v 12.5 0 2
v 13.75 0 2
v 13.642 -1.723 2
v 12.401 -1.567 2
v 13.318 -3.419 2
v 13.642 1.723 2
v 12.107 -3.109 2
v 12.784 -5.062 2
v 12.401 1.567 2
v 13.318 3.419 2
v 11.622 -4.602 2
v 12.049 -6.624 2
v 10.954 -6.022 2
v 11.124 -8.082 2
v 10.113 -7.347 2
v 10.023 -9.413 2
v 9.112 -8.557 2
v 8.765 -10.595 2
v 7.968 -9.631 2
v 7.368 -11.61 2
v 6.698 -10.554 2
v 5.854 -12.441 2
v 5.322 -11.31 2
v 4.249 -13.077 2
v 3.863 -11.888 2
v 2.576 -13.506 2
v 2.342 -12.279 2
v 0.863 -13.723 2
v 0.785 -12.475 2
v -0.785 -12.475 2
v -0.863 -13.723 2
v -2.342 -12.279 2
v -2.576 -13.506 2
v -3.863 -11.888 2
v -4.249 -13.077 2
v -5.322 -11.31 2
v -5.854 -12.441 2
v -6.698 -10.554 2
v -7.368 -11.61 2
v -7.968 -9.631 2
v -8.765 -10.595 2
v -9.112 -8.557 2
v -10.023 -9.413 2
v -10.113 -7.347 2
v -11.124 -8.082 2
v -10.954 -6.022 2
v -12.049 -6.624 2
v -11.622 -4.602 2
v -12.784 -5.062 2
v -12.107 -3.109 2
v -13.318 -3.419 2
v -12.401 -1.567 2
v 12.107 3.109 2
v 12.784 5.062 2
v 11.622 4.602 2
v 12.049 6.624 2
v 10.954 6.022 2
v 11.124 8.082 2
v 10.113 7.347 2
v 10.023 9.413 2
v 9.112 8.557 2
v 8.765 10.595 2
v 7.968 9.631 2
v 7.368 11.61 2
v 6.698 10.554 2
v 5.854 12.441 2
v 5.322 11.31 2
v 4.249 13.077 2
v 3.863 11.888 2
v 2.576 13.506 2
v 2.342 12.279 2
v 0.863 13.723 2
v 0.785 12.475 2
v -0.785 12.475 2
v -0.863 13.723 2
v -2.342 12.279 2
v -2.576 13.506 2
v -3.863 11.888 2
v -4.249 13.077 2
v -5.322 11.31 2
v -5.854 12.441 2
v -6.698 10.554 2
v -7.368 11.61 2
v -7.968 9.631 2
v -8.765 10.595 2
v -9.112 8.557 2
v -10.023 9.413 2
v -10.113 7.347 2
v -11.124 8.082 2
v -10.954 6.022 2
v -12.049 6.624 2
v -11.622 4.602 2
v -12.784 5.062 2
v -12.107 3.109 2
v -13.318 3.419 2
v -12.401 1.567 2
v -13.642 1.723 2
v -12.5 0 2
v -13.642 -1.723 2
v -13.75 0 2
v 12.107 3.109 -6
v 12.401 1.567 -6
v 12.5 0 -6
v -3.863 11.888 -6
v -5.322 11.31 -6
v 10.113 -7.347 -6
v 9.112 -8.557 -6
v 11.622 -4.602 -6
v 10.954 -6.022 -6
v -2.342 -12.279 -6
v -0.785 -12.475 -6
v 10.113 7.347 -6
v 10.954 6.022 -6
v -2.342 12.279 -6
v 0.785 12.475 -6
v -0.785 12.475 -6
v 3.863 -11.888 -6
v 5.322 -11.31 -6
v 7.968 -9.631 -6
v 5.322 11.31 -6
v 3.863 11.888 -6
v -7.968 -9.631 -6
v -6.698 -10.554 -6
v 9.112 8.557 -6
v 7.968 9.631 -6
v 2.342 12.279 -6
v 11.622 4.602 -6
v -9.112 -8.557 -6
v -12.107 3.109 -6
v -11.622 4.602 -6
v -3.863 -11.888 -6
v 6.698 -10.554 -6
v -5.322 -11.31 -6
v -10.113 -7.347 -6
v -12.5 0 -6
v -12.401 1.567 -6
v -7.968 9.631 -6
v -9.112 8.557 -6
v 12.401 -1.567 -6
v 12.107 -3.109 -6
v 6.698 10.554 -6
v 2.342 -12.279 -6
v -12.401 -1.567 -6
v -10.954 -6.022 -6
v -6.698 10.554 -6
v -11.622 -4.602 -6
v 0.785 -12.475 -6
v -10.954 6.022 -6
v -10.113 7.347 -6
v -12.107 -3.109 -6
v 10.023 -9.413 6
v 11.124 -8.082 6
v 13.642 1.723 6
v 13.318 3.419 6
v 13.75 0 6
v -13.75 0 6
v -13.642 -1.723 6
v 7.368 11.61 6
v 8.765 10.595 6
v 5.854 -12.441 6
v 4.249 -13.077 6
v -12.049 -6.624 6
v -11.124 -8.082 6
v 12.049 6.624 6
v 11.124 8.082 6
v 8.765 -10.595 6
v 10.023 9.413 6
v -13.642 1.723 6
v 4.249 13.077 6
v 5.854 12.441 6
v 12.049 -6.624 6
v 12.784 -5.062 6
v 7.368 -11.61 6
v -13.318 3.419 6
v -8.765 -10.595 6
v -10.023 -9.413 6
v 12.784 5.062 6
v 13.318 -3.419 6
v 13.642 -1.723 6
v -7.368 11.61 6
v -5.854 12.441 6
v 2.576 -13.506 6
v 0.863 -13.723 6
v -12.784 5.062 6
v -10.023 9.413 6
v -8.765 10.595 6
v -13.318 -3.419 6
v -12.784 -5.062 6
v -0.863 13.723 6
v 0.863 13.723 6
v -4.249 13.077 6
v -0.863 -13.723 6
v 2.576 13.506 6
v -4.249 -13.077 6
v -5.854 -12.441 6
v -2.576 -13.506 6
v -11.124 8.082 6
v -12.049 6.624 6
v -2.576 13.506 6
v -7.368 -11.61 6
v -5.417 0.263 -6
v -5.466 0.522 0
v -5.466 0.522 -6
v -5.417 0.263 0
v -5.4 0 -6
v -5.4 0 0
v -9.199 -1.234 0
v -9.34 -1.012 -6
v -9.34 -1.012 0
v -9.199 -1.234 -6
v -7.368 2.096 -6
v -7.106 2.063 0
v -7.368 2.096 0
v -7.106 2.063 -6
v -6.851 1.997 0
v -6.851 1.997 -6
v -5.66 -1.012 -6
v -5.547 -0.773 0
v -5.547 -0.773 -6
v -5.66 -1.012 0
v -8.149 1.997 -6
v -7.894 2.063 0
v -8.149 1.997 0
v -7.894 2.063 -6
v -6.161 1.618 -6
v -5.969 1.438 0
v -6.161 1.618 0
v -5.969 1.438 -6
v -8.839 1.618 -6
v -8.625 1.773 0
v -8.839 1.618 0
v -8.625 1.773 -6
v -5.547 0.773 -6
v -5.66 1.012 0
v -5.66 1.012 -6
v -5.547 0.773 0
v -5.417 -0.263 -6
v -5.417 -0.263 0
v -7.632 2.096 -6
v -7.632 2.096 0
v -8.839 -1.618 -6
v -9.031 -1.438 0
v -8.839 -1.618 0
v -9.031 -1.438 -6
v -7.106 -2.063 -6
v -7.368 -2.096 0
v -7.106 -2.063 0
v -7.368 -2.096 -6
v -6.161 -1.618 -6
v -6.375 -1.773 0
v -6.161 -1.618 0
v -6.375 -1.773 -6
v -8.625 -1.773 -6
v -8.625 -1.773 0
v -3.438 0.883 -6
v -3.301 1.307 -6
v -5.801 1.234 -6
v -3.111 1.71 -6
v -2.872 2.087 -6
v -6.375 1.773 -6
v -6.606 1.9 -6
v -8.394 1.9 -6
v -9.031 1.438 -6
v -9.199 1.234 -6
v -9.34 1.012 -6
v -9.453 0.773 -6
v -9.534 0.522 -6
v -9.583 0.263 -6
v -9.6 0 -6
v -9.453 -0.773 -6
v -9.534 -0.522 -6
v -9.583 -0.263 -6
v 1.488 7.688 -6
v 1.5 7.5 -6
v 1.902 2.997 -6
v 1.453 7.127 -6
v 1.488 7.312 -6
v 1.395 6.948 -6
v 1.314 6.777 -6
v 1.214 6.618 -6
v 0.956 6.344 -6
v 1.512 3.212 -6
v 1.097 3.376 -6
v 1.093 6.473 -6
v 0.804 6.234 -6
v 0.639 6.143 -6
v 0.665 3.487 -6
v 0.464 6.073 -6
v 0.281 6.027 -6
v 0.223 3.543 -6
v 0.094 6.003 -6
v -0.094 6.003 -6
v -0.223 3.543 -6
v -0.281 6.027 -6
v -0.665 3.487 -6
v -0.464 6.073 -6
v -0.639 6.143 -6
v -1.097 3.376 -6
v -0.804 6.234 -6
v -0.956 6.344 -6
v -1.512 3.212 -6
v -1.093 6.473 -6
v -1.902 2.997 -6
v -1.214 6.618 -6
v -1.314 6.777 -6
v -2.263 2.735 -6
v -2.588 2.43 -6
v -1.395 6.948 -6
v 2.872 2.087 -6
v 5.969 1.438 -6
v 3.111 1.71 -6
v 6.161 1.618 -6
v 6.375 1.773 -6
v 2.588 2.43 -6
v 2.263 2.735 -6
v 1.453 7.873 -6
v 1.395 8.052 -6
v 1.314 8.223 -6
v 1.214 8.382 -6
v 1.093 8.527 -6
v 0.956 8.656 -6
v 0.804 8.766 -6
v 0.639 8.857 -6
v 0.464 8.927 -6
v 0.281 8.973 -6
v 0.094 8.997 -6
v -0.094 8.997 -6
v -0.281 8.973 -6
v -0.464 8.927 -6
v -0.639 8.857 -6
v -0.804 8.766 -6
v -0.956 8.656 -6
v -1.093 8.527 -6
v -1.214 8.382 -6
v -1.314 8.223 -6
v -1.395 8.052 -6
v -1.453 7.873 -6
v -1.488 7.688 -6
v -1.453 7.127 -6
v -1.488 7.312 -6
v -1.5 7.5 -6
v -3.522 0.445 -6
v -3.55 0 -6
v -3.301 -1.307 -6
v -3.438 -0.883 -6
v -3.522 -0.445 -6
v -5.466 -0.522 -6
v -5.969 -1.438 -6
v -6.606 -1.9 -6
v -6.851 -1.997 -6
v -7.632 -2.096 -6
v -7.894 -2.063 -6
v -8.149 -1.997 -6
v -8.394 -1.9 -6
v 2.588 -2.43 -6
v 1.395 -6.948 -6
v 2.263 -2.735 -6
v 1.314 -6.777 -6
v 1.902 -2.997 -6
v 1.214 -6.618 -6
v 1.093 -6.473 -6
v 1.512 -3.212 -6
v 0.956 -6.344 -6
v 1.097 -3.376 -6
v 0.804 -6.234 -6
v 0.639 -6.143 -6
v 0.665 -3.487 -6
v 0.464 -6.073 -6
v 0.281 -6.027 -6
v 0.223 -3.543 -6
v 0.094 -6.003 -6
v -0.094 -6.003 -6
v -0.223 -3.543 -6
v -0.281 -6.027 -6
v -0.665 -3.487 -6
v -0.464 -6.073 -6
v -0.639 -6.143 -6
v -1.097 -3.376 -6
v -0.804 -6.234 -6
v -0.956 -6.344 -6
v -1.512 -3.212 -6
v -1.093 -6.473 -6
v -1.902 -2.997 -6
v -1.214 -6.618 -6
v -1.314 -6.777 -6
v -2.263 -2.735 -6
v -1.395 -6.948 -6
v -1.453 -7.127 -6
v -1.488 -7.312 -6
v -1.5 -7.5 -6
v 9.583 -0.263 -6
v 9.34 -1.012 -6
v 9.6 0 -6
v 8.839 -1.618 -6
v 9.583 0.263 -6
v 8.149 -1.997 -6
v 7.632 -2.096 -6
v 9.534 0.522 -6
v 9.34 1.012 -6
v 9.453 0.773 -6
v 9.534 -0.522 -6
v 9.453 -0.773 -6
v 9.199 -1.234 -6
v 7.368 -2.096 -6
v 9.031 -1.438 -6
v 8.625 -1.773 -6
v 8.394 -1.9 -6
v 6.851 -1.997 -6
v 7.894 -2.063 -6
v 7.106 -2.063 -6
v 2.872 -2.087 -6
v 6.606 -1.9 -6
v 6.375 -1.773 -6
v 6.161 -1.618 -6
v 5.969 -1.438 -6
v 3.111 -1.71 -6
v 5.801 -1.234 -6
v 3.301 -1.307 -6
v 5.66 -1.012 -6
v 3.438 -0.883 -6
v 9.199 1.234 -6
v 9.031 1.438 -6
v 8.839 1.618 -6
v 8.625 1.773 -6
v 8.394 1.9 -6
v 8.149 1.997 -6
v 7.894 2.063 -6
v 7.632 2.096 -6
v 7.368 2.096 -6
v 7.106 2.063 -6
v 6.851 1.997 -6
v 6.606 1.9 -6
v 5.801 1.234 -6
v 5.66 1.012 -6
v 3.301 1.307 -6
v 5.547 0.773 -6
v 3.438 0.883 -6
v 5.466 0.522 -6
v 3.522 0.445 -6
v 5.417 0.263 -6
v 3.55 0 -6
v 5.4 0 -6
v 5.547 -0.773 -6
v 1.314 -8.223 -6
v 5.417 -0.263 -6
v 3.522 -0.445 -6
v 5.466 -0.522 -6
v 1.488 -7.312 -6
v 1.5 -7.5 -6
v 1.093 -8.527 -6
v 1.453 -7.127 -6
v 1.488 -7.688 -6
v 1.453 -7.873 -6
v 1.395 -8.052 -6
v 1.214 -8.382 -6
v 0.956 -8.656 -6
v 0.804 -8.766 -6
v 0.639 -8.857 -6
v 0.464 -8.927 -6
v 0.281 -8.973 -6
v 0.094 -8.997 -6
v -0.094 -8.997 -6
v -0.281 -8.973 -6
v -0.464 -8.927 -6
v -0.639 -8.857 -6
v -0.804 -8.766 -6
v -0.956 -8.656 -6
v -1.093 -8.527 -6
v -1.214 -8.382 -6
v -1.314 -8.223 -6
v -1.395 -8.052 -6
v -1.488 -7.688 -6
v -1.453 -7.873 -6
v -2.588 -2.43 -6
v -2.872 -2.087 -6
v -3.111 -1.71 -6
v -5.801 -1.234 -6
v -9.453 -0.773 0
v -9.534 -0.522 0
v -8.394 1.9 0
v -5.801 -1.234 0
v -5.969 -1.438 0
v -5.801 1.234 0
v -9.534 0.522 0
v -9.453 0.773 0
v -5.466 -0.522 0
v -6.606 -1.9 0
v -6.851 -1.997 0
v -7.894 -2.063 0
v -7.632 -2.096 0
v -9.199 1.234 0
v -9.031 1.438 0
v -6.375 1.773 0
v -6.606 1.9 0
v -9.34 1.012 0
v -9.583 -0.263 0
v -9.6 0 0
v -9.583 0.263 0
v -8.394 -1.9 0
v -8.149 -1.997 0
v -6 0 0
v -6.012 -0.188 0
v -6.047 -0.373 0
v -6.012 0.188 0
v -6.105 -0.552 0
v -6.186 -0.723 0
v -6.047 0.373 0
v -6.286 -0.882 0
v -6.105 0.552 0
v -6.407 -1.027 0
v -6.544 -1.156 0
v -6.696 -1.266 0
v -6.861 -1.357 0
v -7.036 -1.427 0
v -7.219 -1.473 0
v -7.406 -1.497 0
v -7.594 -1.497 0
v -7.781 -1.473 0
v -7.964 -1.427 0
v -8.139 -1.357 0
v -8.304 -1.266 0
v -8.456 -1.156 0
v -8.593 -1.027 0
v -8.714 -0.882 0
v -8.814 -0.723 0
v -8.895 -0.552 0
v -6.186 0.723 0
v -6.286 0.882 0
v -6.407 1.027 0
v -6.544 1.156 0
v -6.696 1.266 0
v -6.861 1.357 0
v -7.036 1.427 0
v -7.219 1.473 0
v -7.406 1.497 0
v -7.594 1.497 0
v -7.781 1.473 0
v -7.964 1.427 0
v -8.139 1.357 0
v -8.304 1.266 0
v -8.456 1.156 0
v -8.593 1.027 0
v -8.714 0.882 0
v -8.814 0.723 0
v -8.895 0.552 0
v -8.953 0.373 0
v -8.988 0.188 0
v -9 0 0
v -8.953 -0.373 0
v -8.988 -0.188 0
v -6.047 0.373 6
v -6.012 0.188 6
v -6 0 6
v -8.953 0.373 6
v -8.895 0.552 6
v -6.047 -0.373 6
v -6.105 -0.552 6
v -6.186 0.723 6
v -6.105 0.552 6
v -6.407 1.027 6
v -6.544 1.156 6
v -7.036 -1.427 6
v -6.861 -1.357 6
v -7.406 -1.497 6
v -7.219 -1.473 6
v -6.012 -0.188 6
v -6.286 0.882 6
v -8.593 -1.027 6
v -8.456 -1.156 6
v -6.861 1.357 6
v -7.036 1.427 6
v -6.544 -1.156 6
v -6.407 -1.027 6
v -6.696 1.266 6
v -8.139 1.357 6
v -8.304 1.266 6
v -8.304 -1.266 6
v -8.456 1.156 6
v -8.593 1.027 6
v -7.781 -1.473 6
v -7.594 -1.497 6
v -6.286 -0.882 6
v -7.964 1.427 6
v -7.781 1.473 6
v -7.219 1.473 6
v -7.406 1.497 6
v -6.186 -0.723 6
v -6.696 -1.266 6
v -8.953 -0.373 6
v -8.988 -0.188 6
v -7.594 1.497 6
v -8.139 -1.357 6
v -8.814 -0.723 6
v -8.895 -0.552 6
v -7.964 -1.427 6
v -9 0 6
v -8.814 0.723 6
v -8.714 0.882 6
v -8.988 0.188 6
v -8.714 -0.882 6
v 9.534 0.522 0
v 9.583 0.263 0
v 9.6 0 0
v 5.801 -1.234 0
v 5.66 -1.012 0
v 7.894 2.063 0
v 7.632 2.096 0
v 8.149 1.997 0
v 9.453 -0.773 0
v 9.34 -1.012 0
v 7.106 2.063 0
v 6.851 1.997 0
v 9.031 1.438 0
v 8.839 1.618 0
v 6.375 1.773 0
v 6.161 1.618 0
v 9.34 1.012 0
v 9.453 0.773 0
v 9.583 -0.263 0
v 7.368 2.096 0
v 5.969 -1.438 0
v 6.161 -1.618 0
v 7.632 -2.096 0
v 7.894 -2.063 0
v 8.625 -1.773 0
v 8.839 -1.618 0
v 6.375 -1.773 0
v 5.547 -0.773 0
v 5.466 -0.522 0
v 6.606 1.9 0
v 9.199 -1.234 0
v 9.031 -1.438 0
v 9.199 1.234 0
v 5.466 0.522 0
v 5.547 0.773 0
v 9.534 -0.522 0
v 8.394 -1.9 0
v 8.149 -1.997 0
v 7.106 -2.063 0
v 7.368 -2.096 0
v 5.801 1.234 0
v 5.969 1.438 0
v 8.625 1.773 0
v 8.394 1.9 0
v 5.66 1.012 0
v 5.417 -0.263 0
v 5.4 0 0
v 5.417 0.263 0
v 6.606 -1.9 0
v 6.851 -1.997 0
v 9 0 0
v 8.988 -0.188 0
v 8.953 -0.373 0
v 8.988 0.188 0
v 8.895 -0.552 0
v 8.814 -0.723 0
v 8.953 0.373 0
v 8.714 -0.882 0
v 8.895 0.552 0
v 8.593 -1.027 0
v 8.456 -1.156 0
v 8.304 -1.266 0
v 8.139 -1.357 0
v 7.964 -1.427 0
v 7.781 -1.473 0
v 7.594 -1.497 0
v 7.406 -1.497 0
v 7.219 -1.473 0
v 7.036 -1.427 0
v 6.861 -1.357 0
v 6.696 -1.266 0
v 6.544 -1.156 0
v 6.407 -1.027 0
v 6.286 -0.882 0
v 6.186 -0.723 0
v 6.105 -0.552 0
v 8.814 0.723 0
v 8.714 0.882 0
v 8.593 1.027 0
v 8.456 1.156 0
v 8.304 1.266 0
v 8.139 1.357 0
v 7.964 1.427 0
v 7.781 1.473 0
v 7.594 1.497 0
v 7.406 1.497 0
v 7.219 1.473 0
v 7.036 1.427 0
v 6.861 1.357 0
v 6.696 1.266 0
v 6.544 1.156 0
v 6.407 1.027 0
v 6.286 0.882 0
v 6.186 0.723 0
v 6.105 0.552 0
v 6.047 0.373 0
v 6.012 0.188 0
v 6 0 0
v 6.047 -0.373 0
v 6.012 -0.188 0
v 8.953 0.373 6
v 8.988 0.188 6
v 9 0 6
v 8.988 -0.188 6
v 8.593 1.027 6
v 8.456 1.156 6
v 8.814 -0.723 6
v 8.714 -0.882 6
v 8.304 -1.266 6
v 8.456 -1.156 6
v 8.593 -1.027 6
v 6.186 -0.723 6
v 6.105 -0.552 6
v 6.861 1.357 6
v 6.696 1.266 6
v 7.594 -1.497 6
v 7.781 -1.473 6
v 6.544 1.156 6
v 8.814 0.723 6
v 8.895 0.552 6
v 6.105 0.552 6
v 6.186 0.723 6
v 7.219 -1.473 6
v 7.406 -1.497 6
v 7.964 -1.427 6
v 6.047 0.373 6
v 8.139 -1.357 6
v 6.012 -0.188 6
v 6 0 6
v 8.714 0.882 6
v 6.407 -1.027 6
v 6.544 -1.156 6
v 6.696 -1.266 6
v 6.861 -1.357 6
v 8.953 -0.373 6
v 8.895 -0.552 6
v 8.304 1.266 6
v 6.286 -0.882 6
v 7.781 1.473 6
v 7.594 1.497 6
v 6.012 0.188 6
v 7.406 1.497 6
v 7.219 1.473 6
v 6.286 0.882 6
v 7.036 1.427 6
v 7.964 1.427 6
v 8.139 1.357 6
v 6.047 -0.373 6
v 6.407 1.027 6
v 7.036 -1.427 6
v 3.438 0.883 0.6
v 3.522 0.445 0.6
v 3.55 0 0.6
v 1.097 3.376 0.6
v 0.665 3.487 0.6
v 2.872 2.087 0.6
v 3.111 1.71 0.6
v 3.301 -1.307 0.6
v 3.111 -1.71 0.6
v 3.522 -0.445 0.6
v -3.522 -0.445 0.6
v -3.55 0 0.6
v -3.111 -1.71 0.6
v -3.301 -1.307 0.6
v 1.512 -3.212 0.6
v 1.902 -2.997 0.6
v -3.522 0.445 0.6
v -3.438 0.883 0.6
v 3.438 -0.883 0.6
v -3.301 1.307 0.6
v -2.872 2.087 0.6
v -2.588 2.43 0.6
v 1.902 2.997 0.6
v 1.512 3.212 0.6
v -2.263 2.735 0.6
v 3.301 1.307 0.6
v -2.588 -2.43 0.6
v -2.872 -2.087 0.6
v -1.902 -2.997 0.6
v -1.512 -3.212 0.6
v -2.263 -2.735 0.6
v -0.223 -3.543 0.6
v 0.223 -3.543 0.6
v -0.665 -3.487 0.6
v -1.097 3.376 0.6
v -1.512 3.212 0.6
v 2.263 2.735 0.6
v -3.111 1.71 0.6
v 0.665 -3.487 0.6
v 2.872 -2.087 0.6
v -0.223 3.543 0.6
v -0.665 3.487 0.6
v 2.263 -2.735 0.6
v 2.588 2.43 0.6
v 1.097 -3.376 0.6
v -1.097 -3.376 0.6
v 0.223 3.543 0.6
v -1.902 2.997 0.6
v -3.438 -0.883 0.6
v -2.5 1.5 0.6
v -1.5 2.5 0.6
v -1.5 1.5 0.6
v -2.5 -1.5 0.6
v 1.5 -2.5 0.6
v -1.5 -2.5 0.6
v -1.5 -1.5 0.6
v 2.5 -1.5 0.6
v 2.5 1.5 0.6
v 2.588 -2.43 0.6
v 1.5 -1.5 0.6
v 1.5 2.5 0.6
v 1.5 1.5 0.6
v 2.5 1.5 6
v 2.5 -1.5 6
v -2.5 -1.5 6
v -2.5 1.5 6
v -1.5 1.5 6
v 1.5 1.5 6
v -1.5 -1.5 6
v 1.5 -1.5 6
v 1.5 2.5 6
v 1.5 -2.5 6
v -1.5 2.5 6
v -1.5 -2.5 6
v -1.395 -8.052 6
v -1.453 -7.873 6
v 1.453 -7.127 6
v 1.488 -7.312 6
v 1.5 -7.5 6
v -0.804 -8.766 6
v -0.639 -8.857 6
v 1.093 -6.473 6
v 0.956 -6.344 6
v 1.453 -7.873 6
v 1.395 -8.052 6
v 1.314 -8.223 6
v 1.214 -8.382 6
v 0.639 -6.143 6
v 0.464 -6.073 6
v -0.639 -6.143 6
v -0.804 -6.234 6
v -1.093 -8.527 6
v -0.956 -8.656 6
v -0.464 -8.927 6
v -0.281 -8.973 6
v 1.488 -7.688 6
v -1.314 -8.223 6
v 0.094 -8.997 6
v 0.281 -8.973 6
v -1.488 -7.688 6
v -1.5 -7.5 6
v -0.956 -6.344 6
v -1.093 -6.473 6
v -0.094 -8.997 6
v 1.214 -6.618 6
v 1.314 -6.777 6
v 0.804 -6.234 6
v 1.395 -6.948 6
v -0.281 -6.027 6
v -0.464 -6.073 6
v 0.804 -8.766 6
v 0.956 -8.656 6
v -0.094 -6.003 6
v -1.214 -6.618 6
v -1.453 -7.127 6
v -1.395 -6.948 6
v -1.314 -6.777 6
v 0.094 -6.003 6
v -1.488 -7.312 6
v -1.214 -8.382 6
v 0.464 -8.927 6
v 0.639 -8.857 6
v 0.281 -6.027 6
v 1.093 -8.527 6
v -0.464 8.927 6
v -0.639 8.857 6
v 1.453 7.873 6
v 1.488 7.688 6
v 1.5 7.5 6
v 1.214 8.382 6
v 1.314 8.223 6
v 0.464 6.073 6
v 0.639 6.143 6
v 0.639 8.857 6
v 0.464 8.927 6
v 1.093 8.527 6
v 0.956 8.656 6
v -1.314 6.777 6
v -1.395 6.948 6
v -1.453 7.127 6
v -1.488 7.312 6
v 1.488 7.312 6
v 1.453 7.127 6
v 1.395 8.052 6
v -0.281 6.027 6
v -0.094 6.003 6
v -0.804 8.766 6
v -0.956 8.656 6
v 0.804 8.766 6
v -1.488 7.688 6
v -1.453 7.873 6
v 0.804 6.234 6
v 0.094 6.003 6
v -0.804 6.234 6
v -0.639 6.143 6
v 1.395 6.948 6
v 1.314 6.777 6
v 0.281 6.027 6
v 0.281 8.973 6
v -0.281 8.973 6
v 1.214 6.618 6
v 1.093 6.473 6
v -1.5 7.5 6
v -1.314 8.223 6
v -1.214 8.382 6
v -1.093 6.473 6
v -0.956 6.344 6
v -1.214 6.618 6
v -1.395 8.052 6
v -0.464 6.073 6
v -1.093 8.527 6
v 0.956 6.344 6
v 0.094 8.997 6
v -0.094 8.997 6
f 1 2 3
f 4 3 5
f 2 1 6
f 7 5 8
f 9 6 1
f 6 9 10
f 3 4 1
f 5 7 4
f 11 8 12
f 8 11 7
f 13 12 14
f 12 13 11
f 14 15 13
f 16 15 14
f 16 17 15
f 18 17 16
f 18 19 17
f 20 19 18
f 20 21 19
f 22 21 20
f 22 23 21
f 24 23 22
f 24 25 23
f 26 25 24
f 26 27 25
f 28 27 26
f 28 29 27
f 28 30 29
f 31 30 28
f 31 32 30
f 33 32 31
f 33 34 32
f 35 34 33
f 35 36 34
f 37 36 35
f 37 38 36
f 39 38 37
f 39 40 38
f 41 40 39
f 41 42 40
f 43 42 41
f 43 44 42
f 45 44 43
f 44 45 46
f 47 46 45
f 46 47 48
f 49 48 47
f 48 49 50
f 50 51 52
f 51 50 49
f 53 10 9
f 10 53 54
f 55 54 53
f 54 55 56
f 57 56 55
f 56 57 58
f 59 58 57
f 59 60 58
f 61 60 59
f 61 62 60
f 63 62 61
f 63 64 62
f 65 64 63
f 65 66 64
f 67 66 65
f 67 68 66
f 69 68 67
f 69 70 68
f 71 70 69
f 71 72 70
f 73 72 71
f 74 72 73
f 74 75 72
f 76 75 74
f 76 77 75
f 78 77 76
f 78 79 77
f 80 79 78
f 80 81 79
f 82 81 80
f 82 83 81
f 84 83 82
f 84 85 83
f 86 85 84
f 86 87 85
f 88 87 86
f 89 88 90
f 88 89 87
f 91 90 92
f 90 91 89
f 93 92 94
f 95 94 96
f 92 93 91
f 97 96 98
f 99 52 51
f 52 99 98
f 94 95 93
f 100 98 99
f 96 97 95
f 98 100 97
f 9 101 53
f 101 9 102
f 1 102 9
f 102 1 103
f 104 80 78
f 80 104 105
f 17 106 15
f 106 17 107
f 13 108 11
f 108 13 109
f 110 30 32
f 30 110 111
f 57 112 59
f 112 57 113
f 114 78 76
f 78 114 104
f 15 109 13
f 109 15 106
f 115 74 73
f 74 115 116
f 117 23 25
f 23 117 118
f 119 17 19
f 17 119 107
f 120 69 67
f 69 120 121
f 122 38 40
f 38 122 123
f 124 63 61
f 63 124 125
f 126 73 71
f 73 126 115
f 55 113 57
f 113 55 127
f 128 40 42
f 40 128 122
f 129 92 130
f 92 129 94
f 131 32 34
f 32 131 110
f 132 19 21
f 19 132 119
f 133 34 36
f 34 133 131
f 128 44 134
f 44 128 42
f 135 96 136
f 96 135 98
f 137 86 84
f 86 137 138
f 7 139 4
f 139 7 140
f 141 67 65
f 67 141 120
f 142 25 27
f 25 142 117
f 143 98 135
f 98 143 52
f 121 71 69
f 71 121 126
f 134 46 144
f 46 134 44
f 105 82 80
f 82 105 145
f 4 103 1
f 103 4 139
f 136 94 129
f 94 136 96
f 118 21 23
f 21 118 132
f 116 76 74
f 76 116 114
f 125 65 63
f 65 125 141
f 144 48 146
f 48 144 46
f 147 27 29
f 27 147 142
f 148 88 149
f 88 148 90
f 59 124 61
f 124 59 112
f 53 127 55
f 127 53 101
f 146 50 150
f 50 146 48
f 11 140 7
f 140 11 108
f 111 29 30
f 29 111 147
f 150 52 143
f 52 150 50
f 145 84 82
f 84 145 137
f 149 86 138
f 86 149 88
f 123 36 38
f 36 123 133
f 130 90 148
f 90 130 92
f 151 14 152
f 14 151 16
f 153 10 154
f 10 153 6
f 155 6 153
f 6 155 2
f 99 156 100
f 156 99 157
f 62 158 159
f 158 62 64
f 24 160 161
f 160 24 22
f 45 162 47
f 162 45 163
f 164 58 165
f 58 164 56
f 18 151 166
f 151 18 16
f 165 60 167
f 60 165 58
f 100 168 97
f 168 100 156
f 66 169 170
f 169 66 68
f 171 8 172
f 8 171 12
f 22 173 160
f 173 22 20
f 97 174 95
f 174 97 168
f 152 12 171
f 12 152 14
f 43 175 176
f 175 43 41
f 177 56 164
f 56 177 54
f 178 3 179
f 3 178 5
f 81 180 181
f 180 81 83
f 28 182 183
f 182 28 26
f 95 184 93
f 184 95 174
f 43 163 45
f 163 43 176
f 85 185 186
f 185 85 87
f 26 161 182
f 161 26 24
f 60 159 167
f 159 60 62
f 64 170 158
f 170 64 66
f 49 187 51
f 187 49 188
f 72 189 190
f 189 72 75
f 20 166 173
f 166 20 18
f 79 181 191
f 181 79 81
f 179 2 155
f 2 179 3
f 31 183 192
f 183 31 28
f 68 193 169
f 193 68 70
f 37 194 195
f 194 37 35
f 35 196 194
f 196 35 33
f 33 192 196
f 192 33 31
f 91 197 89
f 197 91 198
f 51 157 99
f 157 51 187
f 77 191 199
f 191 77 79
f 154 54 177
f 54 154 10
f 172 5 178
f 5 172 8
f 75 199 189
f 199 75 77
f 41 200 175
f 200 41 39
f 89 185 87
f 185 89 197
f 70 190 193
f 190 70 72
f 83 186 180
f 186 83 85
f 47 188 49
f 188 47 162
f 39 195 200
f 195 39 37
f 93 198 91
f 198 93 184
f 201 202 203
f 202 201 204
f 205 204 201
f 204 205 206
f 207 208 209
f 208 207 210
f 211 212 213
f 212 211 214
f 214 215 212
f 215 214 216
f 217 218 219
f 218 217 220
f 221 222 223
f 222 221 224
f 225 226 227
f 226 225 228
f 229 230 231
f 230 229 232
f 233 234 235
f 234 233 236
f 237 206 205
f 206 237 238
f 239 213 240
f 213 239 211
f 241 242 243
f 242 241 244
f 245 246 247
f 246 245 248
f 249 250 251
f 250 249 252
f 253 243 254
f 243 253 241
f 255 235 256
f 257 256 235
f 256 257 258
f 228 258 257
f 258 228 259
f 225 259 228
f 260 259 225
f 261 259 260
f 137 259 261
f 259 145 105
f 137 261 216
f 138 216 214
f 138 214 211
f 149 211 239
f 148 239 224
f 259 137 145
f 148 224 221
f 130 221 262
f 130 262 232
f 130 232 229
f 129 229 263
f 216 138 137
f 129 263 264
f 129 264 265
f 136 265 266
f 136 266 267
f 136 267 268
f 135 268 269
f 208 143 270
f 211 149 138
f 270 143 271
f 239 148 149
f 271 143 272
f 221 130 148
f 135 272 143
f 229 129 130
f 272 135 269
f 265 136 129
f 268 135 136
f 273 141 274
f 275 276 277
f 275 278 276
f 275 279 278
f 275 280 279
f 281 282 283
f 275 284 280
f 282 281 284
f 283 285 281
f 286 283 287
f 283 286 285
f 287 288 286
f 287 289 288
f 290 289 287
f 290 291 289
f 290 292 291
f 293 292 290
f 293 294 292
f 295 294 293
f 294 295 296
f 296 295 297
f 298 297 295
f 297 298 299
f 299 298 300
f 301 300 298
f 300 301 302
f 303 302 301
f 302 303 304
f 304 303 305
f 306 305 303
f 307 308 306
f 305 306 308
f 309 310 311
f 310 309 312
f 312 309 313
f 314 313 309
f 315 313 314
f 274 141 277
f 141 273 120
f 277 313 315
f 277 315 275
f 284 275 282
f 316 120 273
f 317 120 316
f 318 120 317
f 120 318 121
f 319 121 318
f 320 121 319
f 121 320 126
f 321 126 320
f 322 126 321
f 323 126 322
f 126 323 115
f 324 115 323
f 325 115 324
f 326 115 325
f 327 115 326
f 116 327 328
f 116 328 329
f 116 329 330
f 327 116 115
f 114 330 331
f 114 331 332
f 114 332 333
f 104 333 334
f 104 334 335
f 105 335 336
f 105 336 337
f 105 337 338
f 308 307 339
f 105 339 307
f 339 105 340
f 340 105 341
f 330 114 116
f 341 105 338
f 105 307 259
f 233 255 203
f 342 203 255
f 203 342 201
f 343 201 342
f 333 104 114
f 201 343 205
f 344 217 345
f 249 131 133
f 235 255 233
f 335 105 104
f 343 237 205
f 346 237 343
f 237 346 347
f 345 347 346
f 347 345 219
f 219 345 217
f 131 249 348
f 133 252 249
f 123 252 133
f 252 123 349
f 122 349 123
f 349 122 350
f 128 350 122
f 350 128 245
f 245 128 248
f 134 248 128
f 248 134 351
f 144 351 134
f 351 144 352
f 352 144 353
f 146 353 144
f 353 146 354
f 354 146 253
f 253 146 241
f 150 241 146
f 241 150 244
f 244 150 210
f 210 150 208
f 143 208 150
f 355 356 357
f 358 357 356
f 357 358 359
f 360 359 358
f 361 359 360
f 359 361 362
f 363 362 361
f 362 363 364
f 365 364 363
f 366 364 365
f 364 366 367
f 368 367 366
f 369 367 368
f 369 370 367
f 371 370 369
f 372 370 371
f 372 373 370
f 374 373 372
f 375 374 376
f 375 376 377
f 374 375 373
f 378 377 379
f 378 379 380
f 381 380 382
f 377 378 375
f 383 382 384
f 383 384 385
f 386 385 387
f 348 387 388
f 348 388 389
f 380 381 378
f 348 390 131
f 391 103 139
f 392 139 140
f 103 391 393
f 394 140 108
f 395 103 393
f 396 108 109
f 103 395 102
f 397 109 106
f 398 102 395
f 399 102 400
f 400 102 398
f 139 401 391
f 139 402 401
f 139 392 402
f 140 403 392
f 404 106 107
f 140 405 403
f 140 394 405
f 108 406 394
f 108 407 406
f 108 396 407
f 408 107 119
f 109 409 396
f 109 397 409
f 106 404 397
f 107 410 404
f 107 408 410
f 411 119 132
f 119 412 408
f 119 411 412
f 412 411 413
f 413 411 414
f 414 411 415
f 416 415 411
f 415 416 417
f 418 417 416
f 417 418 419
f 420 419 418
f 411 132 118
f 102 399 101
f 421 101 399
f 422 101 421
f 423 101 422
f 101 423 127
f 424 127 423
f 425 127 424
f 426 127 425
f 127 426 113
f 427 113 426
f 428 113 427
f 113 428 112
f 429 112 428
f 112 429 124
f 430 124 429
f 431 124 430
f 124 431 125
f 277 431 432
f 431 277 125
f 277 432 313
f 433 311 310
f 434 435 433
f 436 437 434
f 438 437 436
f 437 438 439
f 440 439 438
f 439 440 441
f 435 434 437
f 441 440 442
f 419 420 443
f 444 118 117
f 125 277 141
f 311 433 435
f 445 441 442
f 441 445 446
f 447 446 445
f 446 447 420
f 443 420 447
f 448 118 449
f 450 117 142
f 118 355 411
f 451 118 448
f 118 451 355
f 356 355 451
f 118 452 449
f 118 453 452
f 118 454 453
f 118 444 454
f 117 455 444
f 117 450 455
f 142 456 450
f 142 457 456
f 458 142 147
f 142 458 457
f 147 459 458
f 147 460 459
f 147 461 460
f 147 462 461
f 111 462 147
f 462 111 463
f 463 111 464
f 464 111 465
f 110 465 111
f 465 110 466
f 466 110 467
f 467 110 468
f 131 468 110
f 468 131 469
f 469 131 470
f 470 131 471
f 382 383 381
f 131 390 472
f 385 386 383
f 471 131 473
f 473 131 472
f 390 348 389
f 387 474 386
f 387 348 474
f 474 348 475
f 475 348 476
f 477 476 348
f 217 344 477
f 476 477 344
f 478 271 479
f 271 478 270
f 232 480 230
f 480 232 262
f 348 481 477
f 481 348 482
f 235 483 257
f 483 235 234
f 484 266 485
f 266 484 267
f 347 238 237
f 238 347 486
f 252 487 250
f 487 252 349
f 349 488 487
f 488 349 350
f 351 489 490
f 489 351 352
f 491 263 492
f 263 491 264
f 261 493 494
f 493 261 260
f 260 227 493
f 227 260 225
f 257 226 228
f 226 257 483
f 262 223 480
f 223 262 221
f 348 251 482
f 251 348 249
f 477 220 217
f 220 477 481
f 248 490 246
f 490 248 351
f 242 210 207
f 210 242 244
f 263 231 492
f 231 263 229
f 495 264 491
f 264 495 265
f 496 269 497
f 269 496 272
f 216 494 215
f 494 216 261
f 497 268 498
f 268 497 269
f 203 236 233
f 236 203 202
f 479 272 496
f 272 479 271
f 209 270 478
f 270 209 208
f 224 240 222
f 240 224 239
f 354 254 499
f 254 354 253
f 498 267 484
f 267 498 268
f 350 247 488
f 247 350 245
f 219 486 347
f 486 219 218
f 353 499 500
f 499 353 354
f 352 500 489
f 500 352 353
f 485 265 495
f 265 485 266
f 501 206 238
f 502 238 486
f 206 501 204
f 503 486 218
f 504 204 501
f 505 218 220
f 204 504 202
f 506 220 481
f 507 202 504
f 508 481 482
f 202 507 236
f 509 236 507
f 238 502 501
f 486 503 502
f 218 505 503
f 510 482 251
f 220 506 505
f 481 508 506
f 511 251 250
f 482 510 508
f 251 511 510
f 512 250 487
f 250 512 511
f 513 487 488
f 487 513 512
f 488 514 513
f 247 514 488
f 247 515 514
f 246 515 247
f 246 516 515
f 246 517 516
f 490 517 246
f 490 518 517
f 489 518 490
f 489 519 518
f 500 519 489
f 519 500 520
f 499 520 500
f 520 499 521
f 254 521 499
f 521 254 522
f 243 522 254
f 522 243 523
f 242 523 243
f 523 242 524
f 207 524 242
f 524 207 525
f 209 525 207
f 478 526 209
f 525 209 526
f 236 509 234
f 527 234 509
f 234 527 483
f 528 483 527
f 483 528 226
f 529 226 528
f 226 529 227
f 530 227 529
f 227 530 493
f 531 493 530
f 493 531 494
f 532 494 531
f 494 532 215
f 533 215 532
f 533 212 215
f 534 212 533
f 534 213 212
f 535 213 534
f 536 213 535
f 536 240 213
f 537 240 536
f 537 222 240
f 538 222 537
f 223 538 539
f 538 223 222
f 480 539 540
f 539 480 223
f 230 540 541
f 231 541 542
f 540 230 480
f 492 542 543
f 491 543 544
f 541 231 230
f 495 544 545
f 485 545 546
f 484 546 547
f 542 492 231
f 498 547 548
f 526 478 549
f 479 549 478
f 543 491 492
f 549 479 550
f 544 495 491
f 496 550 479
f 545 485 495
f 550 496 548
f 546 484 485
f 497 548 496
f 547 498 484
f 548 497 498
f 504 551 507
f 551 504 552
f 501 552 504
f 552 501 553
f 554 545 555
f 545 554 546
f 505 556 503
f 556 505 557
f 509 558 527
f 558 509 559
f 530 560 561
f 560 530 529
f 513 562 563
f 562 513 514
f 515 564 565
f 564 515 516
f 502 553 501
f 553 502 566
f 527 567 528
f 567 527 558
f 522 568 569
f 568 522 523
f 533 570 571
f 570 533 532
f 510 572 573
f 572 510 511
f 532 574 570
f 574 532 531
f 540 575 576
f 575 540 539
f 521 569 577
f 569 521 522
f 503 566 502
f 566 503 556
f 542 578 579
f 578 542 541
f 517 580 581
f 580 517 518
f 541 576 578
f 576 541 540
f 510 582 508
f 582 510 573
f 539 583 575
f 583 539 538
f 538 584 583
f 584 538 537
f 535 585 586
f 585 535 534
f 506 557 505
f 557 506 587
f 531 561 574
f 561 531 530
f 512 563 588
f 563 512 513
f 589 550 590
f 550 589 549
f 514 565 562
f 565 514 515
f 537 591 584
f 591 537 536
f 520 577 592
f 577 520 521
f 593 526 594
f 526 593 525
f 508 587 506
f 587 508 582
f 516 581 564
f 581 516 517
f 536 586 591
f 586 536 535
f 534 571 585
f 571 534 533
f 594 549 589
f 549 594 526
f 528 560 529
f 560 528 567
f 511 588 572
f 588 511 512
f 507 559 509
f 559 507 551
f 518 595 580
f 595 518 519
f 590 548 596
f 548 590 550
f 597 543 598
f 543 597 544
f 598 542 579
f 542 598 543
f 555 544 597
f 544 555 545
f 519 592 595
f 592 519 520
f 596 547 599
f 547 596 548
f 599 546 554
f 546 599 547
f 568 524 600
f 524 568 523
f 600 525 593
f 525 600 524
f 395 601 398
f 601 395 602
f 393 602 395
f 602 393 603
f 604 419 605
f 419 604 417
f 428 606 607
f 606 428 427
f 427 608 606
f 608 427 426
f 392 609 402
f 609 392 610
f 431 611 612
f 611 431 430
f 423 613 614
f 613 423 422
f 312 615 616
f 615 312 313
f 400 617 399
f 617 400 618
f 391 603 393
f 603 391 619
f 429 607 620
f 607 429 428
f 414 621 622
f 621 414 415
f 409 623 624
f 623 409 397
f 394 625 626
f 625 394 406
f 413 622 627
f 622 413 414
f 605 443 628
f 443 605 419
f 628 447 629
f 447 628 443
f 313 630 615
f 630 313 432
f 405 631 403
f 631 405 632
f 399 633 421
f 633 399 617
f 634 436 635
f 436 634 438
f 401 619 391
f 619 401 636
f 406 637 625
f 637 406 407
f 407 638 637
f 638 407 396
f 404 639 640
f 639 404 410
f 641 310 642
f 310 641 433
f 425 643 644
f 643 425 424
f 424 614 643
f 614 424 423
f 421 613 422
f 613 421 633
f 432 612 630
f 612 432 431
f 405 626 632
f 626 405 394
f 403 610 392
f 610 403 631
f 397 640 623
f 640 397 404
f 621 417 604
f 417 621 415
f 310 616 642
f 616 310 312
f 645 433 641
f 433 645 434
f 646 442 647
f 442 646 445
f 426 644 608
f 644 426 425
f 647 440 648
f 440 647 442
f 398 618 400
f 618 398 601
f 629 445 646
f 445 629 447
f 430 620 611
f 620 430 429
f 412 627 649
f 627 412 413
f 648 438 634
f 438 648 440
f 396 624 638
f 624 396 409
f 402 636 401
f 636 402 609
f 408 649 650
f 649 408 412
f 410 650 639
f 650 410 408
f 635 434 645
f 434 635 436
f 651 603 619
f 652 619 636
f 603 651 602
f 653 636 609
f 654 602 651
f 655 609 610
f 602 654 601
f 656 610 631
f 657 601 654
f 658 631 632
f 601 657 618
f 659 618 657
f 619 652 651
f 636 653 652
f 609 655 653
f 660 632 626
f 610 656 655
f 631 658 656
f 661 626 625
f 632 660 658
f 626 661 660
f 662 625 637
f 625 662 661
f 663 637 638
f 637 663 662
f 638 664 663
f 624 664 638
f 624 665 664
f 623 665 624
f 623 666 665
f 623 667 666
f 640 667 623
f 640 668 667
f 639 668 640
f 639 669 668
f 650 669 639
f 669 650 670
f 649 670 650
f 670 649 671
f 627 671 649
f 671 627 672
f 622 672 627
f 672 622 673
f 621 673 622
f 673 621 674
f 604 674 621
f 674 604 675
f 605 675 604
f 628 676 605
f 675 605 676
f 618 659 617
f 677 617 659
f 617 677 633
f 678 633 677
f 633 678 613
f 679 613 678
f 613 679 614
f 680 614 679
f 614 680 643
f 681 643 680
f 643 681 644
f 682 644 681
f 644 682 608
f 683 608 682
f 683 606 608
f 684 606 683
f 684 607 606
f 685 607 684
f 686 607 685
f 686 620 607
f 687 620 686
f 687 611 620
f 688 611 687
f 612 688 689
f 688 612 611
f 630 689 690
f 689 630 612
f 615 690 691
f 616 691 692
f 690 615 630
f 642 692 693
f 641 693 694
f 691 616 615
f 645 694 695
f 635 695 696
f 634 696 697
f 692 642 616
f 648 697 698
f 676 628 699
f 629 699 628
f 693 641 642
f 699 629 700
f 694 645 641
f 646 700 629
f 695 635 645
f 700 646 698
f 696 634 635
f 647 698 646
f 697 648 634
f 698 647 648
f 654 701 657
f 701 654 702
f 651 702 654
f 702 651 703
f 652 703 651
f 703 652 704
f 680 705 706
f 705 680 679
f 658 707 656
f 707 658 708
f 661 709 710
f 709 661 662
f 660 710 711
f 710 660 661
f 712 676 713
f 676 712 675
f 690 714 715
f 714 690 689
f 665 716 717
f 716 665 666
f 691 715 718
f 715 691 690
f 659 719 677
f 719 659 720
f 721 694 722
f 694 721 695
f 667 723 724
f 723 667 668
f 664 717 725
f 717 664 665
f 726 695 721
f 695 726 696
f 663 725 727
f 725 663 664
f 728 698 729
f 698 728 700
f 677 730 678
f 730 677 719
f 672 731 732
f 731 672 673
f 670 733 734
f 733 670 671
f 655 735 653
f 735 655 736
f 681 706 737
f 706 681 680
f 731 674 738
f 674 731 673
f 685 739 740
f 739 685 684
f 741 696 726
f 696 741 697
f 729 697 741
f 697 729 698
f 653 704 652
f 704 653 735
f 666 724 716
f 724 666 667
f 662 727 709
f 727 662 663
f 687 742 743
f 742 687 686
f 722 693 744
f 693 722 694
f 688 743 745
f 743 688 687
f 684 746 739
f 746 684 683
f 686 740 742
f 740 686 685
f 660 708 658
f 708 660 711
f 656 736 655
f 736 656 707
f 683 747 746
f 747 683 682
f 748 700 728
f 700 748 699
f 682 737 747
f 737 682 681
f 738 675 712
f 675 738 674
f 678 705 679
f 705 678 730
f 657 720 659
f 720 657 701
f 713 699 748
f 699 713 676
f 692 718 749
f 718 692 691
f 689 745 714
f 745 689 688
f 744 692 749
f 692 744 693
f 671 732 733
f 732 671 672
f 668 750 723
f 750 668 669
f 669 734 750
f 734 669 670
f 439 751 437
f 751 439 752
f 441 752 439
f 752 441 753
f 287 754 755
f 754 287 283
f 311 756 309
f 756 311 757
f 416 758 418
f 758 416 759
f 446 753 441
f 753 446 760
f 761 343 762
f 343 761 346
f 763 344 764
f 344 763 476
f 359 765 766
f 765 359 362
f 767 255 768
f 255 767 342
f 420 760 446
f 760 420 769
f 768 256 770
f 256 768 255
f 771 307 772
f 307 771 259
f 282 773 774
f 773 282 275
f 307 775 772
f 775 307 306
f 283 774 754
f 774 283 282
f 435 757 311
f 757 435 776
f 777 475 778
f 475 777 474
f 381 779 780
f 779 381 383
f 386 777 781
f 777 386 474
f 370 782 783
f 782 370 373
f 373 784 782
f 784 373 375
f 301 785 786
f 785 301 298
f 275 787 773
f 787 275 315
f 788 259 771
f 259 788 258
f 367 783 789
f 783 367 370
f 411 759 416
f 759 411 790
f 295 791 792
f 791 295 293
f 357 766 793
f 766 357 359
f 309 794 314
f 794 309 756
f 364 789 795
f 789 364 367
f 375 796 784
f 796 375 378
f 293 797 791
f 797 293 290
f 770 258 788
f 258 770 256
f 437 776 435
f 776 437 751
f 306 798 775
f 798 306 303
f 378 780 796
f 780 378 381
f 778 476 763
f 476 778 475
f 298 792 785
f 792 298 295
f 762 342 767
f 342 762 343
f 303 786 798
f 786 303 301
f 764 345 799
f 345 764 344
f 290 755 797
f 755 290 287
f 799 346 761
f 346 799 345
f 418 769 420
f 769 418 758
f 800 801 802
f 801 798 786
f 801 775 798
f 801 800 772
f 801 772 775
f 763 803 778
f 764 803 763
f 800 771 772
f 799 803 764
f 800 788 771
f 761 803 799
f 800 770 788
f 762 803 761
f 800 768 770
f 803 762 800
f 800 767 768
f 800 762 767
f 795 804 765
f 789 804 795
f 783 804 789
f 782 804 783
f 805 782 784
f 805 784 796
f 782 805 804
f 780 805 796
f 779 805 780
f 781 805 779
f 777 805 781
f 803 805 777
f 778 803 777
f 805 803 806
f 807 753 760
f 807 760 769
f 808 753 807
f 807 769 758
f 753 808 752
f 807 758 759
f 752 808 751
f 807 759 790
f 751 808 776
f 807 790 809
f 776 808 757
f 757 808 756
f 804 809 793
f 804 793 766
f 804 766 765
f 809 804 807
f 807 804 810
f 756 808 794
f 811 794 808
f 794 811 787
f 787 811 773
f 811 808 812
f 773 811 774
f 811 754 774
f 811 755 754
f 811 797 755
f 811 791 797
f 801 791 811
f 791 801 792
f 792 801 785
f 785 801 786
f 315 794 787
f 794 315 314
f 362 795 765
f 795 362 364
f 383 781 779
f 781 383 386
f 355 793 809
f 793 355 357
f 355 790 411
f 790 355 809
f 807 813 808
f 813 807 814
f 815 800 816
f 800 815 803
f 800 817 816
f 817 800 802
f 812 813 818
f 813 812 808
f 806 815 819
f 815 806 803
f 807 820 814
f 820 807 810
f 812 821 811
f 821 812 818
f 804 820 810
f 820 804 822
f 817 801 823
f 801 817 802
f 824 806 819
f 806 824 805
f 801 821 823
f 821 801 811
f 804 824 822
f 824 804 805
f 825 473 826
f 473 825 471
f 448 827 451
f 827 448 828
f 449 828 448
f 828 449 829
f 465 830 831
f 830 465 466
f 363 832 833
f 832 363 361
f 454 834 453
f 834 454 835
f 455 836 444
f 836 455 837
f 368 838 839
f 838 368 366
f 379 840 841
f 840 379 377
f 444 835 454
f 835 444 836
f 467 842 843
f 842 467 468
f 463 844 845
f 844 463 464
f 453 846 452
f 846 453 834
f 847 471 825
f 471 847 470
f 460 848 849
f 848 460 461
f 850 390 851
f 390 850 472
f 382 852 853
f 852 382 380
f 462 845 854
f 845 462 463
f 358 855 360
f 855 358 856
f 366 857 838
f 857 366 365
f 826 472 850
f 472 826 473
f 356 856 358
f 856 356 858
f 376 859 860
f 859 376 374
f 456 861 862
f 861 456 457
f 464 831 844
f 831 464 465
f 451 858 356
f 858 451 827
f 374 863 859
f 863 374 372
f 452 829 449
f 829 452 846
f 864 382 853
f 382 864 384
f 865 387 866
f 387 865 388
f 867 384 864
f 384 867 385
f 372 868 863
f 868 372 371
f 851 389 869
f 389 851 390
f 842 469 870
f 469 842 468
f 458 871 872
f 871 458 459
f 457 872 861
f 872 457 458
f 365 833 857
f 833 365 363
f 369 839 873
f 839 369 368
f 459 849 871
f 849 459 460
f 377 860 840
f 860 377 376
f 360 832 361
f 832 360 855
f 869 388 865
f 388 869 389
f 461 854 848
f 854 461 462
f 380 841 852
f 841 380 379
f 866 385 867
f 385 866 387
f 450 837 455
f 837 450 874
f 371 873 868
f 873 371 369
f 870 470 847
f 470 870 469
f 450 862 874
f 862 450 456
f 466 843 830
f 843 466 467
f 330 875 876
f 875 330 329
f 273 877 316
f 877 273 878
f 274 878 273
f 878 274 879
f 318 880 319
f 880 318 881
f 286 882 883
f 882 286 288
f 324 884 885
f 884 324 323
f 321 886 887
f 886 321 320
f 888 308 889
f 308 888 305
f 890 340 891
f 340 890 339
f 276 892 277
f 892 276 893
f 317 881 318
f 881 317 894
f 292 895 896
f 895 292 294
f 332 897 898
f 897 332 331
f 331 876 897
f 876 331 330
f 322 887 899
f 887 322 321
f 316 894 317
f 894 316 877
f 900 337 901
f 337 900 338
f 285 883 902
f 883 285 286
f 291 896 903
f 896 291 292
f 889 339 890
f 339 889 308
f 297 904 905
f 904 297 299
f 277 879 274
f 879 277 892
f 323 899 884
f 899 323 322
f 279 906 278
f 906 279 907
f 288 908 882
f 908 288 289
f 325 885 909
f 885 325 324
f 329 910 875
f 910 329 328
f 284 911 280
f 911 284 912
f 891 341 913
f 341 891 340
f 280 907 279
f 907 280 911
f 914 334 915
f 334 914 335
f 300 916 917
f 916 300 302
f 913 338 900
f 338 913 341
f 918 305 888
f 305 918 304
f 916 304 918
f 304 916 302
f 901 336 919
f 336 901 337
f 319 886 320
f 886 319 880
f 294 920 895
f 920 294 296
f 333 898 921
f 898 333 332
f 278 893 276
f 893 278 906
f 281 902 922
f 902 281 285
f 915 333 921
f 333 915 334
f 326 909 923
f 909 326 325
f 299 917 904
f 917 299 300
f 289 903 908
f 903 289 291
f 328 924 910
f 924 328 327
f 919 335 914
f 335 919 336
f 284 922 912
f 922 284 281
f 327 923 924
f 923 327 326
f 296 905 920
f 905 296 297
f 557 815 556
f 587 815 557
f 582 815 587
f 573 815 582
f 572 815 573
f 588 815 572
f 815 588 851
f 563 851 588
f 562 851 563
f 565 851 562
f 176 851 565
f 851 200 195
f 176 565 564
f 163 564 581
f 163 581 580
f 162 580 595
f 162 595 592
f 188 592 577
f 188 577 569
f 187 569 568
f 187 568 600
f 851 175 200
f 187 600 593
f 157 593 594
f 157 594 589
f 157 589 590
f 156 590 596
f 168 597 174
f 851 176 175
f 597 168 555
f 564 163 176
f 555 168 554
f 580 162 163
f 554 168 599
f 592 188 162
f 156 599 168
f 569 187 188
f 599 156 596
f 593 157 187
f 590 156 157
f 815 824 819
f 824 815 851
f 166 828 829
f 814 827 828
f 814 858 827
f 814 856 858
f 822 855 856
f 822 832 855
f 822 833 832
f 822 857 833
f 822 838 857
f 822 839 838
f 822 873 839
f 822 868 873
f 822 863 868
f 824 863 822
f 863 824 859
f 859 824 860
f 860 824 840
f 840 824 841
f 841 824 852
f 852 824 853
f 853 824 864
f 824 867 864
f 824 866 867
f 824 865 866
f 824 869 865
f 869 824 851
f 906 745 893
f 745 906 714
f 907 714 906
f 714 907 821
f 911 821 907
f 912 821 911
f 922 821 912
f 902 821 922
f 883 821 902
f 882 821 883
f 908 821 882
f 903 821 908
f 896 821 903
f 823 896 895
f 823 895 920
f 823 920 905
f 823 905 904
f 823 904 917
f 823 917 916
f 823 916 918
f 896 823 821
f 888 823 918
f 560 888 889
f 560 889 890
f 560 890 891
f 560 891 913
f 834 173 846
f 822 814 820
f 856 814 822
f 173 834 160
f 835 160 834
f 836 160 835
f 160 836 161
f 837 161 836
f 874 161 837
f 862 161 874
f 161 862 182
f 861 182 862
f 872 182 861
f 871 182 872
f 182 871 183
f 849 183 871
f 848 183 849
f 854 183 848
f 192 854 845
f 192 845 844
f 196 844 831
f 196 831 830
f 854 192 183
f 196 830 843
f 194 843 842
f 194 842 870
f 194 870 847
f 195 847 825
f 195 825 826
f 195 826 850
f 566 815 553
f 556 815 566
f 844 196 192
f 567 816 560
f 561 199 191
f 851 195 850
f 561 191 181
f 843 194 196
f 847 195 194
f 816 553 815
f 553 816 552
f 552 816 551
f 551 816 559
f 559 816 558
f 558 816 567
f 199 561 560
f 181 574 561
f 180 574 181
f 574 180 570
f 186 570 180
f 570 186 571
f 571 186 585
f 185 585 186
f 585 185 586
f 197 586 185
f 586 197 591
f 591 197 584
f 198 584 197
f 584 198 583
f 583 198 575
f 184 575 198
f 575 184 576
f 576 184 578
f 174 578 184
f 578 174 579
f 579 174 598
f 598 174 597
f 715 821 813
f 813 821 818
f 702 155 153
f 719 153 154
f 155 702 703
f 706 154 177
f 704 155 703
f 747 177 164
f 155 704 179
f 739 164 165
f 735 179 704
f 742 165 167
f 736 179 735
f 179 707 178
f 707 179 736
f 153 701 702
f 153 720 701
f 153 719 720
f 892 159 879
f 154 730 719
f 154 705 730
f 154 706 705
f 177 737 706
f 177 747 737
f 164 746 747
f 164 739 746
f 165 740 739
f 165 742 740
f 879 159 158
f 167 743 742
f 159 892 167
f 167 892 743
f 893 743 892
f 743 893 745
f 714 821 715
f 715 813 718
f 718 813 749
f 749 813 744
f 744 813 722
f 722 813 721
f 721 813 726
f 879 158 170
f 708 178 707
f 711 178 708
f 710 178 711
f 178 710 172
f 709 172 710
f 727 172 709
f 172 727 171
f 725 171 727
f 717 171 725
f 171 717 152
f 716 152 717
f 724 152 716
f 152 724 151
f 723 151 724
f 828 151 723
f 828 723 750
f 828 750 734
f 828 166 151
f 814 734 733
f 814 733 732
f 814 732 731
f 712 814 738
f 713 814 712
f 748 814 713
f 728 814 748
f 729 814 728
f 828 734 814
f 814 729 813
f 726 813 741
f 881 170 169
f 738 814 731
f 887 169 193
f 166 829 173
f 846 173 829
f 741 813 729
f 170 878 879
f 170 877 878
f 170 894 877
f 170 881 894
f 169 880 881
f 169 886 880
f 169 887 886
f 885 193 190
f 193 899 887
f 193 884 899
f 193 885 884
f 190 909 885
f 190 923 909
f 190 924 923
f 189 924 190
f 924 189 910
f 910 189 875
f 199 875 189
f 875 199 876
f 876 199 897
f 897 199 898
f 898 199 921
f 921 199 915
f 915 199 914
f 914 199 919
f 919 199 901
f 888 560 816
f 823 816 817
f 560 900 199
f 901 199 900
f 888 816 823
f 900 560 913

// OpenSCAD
$fn = 50;

difference() {
	union() {
		translate(v = [0, 0, 0]) {
			rotate(a = [0, 0, 0]) {
				difference() {
					union() {
						translate(v = [0, 0, -6.0]) {
							cylinder(h = 12, r = 14.5);
						}
					}
					union() {
						translate(v = [0, 0, 0]) {
							rotate(a = [0, 0, 0]) {
								difference() {
									union() {
										translate(v = [0, 0, -2.0]) {
											cylinder(h = 4, r = 16.0);
										}
									}
									union() {
										translate(v = [0, 0, -2.01]) {
											cylinder(h = 4.02, r = 12.5);
										}
									}
								}
							}
						}
						translate(v = [0, 0, -3]) {
							rotate(a = [0, 0, 0]) {
								difference() {
									union() {
										translate(v = [0, 0, -2.0]) {
											cylinder(h = 4, r = 16.0);
										}
									}
									union() {
										translate(v = [0, 0, -2.01]) {
											cylinder(h = 4.02, r = 12.5);
										}
									}
								}
							}
						}
						translate(v = [0, 0, -6]) {
							rotate(a = [0, 0, 0]) {
								difference() {
									union() {
										translate(v = [0, 0, -2.0]) {
											cylinder(h = 4, r = 16.0);
										}
									}
									union() {
										translate(v = [0, 0, -2.01]) {
											cylinder(h = 4.02, r = 12.5);
										}
									}
								}
							}
						}
						translate(v = [0, 0, 0]) {
							rotate(a = [0, 0, 0]) {
								difference() {
									union() {
										translate(v = [0, 0, -21.0]) {
											cylinder(h = 42, r = 14.75);
										}
									}
									union() {
										translate(v = [0, 0, -21.01]) {
											cylinder(h = 42.02, r = 13.75);
										}
									}
								}
							}
						}
						translate(v = [-7.5, 0, -6.0]) {
							cylinder(h = 6, r = 2.1);
						}
						translate(v = [-7.5, 0, -7.0]) {
							cylinder(h = 14, r = 1.5);
						}
						translate(v = [7.5, 0, -6.0]) {
							cylinder(h = 6, r = 2.1);
						}
						translate(v = [7.5, 0, -7.0]) {
							cylinder(h = 14, r = 1.5);
						}
						translate(v = [0, 0, -6.000000000000001]) {
							cylinder(h = 6.6, r = 3.55);
						}
						translate(v = [-2.5, -1.5, -7.0]) {
							cube(size = [5, 3, 14]);
						}
						translate(v = [-1.5, -2.5, -7.0]) {
							cube(size = [3, 5, 14]);
						}
						translate(v = [0.0, -7.5, -7.0]) {
							cylinder(h = 14, r = 1.5);
						}
						translate(v = [0.0, 7.5, -7.0]) {
							cylinder(h = 14, r = 1.5);
						}
					}
				}
			}
		}
	}
	union();
}
